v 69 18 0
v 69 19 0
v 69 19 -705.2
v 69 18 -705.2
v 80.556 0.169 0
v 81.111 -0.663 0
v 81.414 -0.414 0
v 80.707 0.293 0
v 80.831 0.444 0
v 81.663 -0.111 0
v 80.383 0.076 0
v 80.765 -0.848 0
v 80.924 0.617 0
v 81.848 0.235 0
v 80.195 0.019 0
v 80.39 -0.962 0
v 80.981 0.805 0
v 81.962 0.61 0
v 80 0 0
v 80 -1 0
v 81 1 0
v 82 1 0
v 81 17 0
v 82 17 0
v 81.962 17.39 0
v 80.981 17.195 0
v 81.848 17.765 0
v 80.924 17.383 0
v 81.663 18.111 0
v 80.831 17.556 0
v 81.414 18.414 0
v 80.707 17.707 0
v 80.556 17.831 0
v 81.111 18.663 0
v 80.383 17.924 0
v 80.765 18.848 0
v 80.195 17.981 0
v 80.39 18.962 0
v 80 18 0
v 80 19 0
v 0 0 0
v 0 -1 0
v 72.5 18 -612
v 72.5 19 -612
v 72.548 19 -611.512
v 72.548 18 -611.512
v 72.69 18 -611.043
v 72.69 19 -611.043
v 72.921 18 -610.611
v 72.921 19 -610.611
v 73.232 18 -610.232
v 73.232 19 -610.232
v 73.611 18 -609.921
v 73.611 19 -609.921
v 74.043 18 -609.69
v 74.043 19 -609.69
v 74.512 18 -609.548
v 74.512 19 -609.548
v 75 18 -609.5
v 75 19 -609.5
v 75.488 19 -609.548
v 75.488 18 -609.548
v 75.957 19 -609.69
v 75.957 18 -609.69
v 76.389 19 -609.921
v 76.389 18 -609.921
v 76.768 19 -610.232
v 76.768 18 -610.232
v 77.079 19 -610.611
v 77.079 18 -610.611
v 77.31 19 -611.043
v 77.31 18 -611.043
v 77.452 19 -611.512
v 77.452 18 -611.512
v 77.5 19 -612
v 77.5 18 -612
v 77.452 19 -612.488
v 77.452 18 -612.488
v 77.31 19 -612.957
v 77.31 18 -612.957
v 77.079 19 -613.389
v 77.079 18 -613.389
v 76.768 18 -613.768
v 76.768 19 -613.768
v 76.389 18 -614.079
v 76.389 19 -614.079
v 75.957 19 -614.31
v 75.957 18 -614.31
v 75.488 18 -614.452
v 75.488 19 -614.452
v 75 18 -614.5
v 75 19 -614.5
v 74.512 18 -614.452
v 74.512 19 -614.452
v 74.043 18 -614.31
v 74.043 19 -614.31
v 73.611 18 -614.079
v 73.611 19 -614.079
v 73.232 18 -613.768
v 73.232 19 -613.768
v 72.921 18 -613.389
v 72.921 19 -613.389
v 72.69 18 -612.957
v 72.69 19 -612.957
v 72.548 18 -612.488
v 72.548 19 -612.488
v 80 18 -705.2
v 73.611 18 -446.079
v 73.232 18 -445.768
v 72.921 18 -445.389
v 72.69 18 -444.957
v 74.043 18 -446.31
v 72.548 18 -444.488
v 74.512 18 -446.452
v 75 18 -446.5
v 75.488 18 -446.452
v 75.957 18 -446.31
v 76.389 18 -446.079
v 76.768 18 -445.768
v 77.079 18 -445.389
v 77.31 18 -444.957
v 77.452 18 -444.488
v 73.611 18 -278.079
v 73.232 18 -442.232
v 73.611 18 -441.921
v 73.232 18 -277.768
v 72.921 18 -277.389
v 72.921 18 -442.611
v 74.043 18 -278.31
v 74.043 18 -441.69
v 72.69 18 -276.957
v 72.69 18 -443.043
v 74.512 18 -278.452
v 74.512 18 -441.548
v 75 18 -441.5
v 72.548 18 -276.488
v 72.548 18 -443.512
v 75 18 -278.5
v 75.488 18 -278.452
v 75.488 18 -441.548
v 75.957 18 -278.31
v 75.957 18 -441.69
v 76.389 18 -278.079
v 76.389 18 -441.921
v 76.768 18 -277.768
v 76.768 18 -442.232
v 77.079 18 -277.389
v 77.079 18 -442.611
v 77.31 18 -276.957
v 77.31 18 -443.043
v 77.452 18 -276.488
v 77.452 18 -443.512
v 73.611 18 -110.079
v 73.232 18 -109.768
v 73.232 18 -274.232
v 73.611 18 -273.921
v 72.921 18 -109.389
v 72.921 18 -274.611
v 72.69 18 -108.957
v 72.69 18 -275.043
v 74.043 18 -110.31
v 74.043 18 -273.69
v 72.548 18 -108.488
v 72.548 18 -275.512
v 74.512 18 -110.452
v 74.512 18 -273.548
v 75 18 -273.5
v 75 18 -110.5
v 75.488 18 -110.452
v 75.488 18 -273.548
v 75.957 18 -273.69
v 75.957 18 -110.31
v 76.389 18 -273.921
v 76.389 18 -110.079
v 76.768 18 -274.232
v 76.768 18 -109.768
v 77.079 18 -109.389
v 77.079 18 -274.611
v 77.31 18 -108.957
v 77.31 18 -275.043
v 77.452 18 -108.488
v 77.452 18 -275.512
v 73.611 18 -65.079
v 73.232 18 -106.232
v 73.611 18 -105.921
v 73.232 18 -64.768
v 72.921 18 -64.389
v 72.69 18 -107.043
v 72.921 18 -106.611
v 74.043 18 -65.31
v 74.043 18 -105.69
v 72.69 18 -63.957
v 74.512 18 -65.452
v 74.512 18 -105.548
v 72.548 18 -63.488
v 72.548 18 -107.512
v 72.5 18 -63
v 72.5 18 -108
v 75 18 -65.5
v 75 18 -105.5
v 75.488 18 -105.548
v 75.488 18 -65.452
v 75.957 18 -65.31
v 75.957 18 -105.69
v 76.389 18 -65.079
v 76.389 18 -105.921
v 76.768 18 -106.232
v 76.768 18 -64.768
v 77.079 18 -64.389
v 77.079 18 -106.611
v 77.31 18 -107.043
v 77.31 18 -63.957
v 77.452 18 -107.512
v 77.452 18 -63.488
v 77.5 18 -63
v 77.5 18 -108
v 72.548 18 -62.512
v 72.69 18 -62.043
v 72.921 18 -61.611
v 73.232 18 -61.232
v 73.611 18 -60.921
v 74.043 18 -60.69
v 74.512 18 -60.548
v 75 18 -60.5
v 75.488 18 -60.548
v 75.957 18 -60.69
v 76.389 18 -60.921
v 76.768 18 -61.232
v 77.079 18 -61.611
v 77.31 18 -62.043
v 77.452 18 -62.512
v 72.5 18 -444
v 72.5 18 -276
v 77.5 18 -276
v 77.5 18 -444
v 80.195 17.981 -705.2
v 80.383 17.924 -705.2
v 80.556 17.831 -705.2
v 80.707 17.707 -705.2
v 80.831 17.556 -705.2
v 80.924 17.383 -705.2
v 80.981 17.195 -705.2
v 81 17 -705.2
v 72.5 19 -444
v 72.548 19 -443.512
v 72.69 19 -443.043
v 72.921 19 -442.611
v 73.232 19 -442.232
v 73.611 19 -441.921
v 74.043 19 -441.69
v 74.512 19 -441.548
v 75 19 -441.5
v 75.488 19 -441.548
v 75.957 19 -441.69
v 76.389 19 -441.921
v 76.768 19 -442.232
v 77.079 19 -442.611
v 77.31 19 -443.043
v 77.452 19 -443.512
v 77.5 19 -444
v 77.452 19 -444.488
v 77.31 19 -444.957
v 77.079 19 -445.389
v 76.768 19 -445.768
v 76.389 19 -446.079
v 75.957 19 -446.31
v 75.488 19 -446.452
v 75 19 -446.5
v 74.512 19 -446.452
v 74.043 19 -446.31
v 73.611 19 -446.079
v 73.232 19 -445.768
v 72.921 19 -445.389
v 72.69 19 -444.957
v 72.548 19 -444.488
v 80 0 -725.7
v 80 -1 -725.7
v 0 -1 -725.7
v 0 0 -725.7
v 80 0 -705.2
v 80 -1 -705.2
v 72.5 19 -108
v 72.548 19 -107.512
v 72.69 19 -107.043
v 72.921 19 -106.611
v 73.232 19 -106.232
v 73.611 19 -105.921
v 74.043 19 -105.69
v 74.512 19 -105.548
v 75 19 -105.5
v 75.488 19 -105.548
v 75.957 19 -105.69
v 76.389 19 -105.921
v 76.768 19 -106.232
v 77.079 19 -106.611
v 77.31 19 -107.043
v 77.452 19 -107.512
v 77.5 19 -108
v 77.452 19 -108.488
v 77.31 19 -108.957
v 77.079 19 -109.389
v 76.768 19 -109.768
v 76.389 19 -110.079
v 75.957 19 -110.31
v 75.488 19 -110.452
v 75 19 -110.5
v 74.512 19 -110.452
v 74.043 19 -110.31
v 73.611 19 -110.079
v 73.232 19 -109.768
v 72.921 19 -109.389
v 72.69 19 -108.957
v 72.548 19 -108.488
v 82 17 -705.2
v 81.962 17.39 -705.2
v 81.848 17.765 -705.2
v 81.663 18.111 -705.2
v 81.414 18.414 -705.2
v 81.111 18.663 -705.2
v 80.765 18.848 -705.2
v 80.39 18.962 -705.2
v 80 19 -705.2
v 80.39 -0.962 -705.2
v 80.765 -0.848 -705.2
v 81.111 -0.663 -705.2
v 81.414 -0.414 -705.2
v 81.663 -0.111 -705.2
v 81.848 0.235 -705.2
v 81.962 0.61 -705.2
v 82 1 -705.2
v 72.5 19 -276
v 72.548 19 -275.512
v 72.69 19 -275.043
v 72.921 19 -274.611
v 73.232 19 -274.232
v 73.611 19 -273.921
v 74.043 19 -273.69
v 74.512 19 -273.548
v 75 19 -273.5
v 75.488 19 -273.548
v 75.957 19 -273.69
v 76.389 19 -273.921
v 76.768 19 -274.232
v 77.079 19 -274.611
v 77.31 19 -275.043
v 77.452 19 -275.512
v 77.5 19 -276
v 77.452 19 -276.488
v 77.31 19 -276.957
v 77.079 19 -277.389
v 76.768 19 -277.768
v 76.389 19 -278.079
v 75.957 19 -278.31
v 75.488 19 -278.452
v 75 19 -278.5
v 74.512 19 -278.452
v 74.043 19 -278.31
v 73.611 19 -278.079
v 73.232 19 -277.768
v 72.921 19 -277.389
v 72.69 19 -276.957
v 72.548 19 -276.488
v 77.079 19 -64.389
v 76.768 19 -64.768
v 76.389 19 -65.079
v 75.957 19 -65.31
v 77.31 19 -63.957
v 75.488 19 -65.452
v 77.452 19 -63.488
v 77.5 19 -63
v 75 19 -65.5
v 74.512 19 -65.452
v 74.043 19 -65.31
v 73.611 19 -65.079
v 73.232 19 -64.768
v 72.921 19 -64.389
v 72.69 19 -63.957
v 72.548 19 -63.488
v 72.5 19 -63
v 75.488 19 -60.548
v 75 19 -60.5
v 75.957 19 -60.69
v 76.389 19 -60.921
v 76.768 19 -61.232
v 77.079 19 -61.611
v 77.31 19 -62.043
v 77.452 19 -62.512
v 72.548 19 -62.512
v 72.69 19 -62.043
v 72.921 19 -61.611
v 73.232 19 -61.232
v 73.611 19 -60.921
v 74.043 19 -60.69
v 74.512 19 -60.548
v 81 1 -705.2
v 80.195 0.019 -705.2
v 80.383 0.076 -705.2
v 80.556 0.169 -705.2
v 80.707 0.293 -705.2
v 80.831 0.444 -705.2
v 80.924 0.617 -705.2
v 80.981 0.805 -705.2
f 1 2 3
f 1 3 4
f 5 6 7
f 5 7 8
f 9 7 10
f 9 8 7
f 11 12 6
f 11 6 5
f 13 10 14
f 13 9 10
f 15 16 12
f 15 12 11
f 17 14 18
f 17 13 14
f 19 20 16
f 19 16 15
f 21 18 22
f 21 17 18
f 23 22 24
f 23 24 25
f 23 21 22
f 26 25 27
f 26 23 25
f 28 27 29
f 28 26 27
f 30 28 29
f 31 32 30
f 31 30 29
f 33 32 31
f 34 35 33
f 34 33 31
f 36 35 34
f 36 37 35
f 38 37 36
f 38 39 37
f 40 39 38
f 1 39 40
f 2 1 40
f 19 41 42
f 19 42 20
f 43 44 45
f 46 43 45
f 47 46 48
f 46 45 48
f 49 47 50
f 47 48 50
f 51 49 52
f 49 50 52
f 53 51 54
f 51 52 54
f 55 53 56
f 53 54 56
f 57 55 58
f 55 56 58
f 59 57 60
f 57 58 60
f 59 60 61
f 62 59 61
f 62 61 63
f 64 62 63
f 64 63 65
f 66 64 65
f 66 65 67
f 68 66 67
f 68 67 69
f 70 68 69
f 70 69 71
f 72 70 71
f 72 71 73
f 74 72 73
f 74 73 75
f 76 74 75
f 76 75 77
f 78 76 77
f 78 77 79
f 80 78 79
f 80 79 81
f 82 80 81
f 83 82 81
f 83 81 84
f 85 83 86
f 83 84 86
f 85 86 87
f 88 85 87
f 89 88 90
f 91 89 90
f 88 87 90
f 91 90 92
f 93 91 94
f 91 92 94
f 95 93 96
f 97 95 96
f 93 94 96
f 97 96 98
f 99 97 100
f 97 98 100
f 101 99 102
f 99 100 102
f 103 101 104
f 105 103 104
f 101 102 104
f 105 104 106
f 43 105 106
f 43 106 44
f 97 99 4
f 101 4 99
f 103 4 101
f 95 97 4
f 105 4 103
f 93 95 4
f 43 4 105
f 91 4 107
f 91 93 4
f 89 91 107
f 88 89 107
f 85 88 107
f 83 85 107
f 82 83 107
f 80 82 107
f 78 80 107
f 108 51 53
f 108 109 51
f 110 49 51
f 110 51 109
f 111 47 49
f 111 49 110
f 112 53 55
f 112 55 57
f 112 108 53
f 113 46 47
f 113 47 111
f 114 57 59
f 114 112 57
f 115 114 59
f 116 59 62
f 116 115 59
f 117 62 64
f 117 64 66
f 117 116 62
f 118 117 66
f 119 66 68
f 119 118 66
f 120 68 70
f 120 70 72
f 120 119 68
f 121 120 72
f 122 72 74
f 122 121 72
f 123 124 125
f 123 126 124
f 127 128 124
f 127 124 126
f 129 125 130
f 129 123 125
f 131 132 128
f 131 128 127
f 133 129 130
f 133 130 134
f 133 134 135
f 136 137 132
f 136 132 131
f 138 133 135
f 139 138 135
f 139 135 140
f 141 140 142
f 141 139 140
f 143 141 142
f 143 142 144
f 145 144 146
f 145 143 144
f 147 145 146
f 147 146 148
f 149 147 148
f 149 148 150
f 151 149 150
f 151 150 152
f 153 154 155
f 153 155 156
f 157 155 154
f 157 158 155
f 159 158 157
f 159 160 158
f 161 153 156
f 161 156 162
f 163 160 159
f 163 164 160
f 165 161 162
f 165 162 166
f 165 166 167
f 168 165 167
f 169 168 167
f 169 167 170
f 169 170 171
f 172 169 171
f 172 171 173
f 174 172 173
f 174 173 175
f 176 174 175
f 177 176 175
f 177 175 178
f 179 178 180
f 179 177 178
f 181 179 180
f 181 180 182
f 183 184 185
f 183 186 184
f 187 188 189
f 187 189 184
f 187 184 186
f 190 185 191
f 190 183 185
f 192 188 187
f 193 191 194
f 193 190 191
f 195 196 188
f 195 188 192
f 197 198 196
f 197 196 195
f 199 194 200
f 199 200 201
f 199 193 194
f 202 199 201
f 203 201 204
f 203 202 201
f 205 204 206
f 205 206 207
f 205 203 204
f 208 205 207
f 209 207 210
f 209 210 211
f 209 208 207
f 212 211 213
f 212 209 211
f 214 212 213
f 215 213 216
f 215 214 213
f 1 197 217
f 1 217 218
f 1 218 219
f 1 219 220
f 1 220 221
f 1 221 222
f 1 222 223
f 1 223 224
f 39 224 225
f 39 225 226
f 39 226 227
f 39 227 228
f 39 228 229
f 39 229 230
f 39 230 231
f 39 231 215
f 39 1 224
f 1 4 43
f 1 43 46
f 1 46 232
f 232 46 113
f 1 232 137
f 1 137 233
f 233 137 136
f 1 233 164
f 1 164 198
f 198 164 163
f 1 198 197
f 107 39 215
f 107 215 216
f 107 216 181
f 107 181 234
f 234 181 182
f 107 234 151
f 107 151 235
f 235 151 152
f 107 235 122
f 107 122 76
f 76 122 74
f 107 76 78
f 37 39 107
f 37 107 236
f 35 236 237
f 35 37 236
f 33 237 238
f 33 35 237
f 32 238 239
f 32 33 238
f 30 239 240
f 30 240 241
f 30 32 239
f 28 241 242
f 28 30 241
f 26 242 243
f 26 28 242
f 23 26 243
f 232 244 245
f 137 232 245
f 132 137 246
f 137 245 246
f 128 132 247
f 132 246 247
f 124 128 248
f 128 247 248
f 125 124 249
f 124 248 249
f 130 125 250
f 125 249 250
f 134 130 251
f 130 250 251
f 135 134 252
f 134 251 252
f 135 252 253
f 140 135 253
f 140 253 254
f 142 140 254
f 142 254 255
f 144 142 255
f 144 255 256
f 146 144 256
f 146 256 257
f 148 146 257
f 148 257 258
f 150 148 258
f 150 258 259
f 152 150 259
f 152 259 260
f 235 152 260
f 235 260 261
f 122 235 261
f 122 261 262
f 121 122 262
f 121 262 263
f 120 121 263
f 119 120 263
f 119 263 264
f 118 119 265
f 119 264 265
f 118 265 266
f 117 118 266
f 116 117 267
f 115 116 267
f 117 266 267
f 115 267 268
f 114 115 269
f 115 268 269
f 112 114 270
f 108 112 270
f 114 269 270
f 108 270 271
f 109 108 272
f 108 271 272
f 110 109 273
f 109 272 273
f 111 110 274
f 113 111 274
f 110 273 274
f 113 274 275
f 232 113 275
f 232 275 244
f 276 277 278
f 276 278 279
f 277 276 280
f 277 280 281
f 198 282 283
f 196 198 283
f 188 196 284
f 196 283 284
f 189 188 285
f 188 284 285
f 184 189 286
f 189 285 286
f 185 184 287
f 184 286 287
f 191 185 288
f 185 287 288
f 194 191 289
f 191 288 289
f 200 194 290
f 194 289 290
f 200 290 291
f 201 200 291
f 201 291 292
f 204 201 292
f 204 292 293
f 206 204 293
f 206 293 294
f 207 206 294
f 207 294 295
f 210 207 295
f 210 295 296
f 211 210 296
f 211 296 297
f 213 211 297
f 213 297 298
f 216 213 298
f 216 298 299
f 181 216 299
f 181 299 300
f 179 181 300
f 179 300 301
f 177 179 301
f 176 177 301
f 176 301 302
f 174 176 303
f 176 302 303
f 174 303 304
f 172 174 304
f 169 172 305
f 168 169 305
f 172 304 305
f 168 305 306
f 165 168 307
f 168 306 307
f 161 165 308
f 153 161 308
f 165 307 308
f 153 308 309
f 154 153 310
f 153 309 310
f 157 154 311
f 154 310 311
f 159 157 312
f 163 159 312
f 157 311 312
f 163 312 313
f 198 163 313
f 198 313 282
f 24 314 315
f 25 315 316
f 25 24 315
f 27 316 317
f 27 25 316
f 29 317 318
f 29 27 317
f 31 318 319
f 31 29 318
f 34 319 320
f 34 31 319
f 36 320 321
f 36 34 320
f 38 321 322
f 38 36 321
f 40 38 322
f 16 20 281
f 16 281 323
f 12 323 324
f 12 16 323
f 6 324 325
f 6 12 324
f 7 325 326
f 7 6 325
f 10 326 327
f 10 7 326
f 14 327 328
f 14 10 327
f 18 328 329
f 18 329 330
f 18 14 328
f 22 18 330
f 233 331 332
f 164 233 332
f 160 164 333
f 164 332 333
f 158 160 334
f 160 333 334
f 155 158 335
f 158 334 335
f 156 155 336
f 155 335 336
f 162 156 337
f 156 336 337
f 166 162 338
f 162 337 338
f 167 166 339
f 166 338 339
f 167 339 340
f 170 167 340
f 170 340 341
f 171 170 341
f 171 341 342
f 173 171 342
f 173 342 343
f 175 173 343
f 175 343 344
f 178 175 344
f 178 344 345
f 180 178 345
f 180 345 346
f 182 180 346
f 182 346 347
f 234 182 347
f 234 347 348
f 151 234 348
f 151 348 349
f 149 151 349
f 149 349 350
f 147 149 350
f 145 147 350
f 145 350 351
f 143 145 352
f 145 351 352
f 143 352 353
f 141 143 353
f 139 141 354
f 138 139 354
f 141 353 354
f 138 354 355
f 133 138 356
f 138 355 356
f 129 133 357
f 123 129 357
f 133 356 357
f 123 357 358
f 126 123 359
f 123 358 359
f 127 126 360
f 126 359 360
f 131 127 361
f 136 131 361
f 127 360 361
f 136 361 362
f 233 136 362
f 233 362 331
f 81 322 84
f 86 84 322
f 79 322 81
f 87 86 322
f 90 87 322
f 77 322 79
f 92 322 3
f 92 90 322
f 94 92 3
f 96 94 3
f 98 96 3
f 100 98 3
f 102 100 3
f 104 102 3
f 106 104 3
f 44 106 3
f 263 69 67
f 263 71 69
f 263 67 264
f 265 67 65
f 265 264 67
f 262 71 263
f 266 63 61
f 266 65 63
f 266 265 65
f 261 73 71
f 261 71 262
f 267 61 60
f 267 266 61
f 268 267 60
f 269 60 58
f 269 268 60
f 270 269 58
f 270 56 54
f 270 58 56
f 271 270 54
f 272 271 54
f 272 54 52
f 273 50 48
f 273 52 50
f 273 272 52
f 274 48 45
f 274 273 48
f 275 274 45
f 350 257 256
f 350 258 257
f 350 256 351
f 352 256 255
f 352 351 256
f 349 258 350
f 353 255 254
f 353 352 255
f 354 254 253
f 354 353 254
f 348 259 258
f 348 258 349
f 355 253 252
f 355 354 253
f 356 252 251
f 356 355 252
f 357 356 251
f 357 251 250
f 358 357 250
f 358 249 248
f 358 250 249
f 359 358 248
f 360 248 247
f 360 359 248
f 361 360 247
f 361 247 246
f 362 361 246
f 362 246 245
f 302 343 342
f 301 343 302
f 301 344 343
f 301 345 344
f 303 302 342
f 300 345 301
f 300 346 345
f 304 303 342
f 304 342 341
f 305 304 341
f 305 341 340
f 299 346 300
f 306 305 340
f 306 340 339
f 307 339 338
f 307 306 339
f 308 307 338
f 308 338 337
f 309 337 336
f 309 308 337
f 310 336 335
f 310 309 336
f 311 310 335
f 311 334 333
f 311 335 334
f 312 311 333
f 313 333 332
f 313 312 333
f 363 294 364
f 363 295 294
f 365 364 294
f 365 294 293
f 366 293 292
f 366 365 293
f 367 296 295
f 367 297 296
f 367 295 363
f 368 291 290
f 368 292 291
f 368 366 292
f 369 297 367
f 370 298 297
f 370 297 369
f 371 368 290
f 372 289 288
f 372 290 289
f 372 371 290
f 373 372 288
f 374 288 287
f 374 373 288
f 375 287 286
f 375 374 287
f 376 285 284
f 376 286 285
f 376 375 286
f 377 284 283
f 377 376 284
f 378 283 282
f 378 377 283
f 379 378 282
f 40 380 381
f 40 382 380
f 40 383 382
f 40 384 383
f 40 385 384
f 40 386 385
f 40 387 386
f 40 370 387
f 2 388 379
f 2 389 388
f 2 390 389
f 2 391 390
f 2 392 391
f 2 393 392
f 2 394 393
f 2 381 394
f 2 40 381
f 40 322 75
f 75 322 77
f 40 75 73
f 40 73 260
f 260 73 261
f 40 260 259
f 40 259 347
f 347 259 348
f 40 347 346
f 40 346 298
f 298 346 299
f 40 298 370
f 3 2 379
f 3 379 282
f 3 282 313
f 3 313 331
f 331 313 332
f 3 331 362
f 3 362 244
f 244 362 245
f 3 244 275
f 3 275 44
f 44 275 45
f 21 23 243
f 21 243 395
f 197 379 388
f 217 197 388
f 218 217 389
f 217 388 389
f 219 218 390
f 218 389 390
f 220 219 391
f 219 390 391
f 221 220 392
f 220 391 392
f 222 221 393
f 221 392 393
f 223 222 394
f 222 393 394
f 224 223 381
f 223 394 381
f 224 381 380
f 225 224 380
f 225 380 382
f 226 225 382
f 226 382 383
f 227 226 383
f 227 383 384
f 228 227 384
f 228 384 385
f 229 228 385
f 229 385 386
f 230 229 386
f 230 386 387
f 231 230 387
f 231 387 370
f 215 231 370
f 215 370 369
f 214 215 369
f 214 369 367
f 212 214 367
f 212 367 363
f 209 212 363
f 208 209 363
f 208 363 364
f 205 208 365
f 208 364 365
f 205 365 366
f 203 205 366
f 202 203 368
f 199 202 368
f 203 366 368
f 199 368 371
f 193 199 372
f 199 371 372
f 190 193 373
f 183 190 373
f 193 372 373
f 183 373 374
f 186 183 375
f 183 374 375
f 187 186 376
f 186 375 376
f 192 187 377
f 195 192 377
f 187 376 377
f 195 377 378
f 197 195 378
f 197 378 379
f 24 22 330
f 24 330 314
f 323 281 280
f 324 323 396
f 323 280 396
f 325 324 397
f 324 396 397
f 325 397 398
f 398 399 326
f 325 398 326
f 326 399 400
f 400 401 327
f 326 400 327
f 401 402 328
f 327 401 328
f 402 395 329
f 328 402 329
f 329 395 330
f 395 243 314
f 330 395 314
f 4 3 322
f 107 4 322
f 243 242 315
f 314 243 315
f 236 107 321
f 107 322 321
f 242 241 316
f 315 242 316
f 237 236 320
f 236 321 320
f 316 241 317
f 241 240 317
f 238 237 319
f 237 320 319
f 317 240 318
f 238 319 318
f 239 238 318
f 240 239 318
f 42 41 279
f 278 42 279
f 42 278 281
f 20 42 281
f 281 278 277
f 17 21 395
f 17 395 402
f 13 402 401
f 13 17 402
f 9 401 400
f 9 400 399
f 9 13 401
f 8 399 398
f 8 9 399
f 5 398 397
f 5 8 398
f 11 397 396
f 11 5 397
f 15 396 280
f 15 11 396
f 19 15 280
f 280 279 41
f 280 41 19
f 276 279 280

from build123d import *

# Parameters (mm, degrees)
SKETCH1_W                    = 82
SKETCH1_H                    = 725.7
BASE_FLANGE1_DEPTH           = 1
EDGE_FLANGE1_STRIP_W         = 6
EDGE_FLANGE1_STRIP_H         = 1
EDGE_FLANGE1_STRIP_CUT_DEPTH = 725.7
EDGE_FLANGE1_DEPTH           = 725.7
EDGE_FLANGE2_STRIP_W         = 6
EDGE_FLANGE2_STRIP_H         = 1
EDGE_FLANGE2_STRIP_CUT_DEPTH = 725.7
EDGE_FLANGE2_DEPTH           = 725.7
SKETCH19_R                   = 2.5
CUT_EXTRUDE2_DEPTH           = 10
CUT_EXTRUDE3_START           = -725.7
CUT_EXTRUDE3_DEPTH           = 20.5


# Read off the part's stored shape, not the designer's step: Cut-Extrude3
# Sheet-metal steps are written as plain solids
with BuildPart() as part:
    # Sketch1 → Base-Flange1 (new body)
    with BuildSketch(Plane(origin=(0, 0, 0), x_dir=(1, 0, 0), z_dir=(0, 1, 0))):
        with Locations((41, 362.85)):
            Rectangle(SKETCH1_W, SKETCH1_H)
    extrude(amount=-BASE_FLANGE1_DEPTH)

    # Edge-Flange1 strip (across the edge) → Edge-Flange1 strip cut (cut)
    with BuildSketch(Plane(origin=(82, 0, 0), x_dir=(-1, 0, 0), z_dir=(0, 0, -1))):
        with Locations((-1, -0.5)):
            Rectangle(EDGE_FLANGE1_STRIP_W, EDGE_FLANGE1_STRIP_H)
    extrude(amount=EDGE_FLANGE1_STRIP_CUT_DEPTH, mode=Mode.SUBTRACT)

    # Edge-Flange1 section (across the edge) → Edge-Flange1 (add)
    with BuildSketch(Plane(origin=(82, 0, 0), x_dir=(-1, 0, 0), z_dir=(0, 0, -1))):
        with BuildLine():
            Line((0, 1), (0, 19))
            Line((0, 19), (1, 19))
            Line((1, 19), (1, 1))
            ThreePointArc((1, 1), (1.292893219, 0.292893219), (2, 0))
            Line((2, 0), (2, -1))
            ThreePointArc((2, -1), (0.585786438, -0.414213562), (0, 1))
        make_face()
    extrude(amount=EDGE_FLANGE1_DEPTH)

    # Edge-Flange2 strip (across the edge) → Edge-Flange2 strip cut (cut)
    with BuildSketch(Plane(origin=(81, 19, 0), x_dir=(0, -1, 0), z_dir=(0, 0, -1))):
        with Locations((-1, -0.5)):
            Rectangle(EDGE_FLANGE2_STRIP_W, EDGE_FLANGE2_STRIP_H)
    extrude(amount=EDGE_FLANGE2_STRIP_CUT_DEPTH, mode=Mode.SUBTRACT)

    # Edge-Flange2 section (across the edge) → Edge-Flange2 (add)
    with BuildSketch(Plane(origin=(81, 19, 0), x_dir=(0, -1, 0), z_dir=(0, 0, -1))):
        with BuildLine():
            Line((0, 1), (0, 12))
            Line((0, 12), (1, 12))
            Line((1, 12), (1, 1))
            ThreePointArc((1, 1), (1.292893219, 0.292893219), (2, 0))
            Line((2, 0), (2, -1))
            ThreePointArc((2, -1), (0.585786438, -0.414213562), (0, 1))
        make_face()
    extrude(amount=EDGE_FLANGE2_DEPTH)

    # Sketch19 → Cut-Extrude2 (cut)
    with BuildSketch(Plane(origin=(0, 19, 0), x_dir=(1, 0, 0), z_dir=(0, 1, 0))):
        with Locations(Location((75, 63, 0), (0, 0, 180))):
            Circle(SKETCH19_R)
        with Locations(Location((75, 108, 0), (0, 0, 180))):
            Circle(SKETCH19_R)
        with Locations(Location((75, 276, 0), (0, 0, 180))):
            Circle(SKETCH19_R)
        with Locations(Location((75, 444, 0), (0, 0, 180))):
            Circle(SKETCH19_R)
        with Locations(Location((75, 612, 0), (0, 0, 180))):
            Circle(SKETCH19_R)
        with Locations((75, 780)):
            Circle(SKETCH19_R)
    extrude(amount=-CUT_EXTRUDE2_DEPTH, mode=Mode.SUBTRACT)

    # Cut-Extrude3 outline → Cut-Extrude3 (cut)
    with BuildSketch(Plane.XY.offset(CUT_EXTRUDE3_START)):
        with BuildLine():
            ThreePointArc((81, 1), (80.707106781, 0.292893219), (80, 0))
            Line((80, 0), (80, -1))
            ThreePointArc((80, -1), (81.414213562, -0.414213562), (82, 1))
            Line((82, 1), (82, 17))
            ThreePointArc((82, 17), (81.414213562, 18.414213562), (80, 19))
            Line((80, 19), (69, 19))
            Line((69, 19), (69, 18))
            Line((69, 18), (80, 18))
            ThreePointArc((80, 18), (80.707106781, 17.707106781), (81, 17))
            Line((81, 17), (81, 1))
        make_face()
    extrude(amount=CUT_EXTRUDE3_DEPTH, mode=Mode.SUBTRACT)


solid = part.part
